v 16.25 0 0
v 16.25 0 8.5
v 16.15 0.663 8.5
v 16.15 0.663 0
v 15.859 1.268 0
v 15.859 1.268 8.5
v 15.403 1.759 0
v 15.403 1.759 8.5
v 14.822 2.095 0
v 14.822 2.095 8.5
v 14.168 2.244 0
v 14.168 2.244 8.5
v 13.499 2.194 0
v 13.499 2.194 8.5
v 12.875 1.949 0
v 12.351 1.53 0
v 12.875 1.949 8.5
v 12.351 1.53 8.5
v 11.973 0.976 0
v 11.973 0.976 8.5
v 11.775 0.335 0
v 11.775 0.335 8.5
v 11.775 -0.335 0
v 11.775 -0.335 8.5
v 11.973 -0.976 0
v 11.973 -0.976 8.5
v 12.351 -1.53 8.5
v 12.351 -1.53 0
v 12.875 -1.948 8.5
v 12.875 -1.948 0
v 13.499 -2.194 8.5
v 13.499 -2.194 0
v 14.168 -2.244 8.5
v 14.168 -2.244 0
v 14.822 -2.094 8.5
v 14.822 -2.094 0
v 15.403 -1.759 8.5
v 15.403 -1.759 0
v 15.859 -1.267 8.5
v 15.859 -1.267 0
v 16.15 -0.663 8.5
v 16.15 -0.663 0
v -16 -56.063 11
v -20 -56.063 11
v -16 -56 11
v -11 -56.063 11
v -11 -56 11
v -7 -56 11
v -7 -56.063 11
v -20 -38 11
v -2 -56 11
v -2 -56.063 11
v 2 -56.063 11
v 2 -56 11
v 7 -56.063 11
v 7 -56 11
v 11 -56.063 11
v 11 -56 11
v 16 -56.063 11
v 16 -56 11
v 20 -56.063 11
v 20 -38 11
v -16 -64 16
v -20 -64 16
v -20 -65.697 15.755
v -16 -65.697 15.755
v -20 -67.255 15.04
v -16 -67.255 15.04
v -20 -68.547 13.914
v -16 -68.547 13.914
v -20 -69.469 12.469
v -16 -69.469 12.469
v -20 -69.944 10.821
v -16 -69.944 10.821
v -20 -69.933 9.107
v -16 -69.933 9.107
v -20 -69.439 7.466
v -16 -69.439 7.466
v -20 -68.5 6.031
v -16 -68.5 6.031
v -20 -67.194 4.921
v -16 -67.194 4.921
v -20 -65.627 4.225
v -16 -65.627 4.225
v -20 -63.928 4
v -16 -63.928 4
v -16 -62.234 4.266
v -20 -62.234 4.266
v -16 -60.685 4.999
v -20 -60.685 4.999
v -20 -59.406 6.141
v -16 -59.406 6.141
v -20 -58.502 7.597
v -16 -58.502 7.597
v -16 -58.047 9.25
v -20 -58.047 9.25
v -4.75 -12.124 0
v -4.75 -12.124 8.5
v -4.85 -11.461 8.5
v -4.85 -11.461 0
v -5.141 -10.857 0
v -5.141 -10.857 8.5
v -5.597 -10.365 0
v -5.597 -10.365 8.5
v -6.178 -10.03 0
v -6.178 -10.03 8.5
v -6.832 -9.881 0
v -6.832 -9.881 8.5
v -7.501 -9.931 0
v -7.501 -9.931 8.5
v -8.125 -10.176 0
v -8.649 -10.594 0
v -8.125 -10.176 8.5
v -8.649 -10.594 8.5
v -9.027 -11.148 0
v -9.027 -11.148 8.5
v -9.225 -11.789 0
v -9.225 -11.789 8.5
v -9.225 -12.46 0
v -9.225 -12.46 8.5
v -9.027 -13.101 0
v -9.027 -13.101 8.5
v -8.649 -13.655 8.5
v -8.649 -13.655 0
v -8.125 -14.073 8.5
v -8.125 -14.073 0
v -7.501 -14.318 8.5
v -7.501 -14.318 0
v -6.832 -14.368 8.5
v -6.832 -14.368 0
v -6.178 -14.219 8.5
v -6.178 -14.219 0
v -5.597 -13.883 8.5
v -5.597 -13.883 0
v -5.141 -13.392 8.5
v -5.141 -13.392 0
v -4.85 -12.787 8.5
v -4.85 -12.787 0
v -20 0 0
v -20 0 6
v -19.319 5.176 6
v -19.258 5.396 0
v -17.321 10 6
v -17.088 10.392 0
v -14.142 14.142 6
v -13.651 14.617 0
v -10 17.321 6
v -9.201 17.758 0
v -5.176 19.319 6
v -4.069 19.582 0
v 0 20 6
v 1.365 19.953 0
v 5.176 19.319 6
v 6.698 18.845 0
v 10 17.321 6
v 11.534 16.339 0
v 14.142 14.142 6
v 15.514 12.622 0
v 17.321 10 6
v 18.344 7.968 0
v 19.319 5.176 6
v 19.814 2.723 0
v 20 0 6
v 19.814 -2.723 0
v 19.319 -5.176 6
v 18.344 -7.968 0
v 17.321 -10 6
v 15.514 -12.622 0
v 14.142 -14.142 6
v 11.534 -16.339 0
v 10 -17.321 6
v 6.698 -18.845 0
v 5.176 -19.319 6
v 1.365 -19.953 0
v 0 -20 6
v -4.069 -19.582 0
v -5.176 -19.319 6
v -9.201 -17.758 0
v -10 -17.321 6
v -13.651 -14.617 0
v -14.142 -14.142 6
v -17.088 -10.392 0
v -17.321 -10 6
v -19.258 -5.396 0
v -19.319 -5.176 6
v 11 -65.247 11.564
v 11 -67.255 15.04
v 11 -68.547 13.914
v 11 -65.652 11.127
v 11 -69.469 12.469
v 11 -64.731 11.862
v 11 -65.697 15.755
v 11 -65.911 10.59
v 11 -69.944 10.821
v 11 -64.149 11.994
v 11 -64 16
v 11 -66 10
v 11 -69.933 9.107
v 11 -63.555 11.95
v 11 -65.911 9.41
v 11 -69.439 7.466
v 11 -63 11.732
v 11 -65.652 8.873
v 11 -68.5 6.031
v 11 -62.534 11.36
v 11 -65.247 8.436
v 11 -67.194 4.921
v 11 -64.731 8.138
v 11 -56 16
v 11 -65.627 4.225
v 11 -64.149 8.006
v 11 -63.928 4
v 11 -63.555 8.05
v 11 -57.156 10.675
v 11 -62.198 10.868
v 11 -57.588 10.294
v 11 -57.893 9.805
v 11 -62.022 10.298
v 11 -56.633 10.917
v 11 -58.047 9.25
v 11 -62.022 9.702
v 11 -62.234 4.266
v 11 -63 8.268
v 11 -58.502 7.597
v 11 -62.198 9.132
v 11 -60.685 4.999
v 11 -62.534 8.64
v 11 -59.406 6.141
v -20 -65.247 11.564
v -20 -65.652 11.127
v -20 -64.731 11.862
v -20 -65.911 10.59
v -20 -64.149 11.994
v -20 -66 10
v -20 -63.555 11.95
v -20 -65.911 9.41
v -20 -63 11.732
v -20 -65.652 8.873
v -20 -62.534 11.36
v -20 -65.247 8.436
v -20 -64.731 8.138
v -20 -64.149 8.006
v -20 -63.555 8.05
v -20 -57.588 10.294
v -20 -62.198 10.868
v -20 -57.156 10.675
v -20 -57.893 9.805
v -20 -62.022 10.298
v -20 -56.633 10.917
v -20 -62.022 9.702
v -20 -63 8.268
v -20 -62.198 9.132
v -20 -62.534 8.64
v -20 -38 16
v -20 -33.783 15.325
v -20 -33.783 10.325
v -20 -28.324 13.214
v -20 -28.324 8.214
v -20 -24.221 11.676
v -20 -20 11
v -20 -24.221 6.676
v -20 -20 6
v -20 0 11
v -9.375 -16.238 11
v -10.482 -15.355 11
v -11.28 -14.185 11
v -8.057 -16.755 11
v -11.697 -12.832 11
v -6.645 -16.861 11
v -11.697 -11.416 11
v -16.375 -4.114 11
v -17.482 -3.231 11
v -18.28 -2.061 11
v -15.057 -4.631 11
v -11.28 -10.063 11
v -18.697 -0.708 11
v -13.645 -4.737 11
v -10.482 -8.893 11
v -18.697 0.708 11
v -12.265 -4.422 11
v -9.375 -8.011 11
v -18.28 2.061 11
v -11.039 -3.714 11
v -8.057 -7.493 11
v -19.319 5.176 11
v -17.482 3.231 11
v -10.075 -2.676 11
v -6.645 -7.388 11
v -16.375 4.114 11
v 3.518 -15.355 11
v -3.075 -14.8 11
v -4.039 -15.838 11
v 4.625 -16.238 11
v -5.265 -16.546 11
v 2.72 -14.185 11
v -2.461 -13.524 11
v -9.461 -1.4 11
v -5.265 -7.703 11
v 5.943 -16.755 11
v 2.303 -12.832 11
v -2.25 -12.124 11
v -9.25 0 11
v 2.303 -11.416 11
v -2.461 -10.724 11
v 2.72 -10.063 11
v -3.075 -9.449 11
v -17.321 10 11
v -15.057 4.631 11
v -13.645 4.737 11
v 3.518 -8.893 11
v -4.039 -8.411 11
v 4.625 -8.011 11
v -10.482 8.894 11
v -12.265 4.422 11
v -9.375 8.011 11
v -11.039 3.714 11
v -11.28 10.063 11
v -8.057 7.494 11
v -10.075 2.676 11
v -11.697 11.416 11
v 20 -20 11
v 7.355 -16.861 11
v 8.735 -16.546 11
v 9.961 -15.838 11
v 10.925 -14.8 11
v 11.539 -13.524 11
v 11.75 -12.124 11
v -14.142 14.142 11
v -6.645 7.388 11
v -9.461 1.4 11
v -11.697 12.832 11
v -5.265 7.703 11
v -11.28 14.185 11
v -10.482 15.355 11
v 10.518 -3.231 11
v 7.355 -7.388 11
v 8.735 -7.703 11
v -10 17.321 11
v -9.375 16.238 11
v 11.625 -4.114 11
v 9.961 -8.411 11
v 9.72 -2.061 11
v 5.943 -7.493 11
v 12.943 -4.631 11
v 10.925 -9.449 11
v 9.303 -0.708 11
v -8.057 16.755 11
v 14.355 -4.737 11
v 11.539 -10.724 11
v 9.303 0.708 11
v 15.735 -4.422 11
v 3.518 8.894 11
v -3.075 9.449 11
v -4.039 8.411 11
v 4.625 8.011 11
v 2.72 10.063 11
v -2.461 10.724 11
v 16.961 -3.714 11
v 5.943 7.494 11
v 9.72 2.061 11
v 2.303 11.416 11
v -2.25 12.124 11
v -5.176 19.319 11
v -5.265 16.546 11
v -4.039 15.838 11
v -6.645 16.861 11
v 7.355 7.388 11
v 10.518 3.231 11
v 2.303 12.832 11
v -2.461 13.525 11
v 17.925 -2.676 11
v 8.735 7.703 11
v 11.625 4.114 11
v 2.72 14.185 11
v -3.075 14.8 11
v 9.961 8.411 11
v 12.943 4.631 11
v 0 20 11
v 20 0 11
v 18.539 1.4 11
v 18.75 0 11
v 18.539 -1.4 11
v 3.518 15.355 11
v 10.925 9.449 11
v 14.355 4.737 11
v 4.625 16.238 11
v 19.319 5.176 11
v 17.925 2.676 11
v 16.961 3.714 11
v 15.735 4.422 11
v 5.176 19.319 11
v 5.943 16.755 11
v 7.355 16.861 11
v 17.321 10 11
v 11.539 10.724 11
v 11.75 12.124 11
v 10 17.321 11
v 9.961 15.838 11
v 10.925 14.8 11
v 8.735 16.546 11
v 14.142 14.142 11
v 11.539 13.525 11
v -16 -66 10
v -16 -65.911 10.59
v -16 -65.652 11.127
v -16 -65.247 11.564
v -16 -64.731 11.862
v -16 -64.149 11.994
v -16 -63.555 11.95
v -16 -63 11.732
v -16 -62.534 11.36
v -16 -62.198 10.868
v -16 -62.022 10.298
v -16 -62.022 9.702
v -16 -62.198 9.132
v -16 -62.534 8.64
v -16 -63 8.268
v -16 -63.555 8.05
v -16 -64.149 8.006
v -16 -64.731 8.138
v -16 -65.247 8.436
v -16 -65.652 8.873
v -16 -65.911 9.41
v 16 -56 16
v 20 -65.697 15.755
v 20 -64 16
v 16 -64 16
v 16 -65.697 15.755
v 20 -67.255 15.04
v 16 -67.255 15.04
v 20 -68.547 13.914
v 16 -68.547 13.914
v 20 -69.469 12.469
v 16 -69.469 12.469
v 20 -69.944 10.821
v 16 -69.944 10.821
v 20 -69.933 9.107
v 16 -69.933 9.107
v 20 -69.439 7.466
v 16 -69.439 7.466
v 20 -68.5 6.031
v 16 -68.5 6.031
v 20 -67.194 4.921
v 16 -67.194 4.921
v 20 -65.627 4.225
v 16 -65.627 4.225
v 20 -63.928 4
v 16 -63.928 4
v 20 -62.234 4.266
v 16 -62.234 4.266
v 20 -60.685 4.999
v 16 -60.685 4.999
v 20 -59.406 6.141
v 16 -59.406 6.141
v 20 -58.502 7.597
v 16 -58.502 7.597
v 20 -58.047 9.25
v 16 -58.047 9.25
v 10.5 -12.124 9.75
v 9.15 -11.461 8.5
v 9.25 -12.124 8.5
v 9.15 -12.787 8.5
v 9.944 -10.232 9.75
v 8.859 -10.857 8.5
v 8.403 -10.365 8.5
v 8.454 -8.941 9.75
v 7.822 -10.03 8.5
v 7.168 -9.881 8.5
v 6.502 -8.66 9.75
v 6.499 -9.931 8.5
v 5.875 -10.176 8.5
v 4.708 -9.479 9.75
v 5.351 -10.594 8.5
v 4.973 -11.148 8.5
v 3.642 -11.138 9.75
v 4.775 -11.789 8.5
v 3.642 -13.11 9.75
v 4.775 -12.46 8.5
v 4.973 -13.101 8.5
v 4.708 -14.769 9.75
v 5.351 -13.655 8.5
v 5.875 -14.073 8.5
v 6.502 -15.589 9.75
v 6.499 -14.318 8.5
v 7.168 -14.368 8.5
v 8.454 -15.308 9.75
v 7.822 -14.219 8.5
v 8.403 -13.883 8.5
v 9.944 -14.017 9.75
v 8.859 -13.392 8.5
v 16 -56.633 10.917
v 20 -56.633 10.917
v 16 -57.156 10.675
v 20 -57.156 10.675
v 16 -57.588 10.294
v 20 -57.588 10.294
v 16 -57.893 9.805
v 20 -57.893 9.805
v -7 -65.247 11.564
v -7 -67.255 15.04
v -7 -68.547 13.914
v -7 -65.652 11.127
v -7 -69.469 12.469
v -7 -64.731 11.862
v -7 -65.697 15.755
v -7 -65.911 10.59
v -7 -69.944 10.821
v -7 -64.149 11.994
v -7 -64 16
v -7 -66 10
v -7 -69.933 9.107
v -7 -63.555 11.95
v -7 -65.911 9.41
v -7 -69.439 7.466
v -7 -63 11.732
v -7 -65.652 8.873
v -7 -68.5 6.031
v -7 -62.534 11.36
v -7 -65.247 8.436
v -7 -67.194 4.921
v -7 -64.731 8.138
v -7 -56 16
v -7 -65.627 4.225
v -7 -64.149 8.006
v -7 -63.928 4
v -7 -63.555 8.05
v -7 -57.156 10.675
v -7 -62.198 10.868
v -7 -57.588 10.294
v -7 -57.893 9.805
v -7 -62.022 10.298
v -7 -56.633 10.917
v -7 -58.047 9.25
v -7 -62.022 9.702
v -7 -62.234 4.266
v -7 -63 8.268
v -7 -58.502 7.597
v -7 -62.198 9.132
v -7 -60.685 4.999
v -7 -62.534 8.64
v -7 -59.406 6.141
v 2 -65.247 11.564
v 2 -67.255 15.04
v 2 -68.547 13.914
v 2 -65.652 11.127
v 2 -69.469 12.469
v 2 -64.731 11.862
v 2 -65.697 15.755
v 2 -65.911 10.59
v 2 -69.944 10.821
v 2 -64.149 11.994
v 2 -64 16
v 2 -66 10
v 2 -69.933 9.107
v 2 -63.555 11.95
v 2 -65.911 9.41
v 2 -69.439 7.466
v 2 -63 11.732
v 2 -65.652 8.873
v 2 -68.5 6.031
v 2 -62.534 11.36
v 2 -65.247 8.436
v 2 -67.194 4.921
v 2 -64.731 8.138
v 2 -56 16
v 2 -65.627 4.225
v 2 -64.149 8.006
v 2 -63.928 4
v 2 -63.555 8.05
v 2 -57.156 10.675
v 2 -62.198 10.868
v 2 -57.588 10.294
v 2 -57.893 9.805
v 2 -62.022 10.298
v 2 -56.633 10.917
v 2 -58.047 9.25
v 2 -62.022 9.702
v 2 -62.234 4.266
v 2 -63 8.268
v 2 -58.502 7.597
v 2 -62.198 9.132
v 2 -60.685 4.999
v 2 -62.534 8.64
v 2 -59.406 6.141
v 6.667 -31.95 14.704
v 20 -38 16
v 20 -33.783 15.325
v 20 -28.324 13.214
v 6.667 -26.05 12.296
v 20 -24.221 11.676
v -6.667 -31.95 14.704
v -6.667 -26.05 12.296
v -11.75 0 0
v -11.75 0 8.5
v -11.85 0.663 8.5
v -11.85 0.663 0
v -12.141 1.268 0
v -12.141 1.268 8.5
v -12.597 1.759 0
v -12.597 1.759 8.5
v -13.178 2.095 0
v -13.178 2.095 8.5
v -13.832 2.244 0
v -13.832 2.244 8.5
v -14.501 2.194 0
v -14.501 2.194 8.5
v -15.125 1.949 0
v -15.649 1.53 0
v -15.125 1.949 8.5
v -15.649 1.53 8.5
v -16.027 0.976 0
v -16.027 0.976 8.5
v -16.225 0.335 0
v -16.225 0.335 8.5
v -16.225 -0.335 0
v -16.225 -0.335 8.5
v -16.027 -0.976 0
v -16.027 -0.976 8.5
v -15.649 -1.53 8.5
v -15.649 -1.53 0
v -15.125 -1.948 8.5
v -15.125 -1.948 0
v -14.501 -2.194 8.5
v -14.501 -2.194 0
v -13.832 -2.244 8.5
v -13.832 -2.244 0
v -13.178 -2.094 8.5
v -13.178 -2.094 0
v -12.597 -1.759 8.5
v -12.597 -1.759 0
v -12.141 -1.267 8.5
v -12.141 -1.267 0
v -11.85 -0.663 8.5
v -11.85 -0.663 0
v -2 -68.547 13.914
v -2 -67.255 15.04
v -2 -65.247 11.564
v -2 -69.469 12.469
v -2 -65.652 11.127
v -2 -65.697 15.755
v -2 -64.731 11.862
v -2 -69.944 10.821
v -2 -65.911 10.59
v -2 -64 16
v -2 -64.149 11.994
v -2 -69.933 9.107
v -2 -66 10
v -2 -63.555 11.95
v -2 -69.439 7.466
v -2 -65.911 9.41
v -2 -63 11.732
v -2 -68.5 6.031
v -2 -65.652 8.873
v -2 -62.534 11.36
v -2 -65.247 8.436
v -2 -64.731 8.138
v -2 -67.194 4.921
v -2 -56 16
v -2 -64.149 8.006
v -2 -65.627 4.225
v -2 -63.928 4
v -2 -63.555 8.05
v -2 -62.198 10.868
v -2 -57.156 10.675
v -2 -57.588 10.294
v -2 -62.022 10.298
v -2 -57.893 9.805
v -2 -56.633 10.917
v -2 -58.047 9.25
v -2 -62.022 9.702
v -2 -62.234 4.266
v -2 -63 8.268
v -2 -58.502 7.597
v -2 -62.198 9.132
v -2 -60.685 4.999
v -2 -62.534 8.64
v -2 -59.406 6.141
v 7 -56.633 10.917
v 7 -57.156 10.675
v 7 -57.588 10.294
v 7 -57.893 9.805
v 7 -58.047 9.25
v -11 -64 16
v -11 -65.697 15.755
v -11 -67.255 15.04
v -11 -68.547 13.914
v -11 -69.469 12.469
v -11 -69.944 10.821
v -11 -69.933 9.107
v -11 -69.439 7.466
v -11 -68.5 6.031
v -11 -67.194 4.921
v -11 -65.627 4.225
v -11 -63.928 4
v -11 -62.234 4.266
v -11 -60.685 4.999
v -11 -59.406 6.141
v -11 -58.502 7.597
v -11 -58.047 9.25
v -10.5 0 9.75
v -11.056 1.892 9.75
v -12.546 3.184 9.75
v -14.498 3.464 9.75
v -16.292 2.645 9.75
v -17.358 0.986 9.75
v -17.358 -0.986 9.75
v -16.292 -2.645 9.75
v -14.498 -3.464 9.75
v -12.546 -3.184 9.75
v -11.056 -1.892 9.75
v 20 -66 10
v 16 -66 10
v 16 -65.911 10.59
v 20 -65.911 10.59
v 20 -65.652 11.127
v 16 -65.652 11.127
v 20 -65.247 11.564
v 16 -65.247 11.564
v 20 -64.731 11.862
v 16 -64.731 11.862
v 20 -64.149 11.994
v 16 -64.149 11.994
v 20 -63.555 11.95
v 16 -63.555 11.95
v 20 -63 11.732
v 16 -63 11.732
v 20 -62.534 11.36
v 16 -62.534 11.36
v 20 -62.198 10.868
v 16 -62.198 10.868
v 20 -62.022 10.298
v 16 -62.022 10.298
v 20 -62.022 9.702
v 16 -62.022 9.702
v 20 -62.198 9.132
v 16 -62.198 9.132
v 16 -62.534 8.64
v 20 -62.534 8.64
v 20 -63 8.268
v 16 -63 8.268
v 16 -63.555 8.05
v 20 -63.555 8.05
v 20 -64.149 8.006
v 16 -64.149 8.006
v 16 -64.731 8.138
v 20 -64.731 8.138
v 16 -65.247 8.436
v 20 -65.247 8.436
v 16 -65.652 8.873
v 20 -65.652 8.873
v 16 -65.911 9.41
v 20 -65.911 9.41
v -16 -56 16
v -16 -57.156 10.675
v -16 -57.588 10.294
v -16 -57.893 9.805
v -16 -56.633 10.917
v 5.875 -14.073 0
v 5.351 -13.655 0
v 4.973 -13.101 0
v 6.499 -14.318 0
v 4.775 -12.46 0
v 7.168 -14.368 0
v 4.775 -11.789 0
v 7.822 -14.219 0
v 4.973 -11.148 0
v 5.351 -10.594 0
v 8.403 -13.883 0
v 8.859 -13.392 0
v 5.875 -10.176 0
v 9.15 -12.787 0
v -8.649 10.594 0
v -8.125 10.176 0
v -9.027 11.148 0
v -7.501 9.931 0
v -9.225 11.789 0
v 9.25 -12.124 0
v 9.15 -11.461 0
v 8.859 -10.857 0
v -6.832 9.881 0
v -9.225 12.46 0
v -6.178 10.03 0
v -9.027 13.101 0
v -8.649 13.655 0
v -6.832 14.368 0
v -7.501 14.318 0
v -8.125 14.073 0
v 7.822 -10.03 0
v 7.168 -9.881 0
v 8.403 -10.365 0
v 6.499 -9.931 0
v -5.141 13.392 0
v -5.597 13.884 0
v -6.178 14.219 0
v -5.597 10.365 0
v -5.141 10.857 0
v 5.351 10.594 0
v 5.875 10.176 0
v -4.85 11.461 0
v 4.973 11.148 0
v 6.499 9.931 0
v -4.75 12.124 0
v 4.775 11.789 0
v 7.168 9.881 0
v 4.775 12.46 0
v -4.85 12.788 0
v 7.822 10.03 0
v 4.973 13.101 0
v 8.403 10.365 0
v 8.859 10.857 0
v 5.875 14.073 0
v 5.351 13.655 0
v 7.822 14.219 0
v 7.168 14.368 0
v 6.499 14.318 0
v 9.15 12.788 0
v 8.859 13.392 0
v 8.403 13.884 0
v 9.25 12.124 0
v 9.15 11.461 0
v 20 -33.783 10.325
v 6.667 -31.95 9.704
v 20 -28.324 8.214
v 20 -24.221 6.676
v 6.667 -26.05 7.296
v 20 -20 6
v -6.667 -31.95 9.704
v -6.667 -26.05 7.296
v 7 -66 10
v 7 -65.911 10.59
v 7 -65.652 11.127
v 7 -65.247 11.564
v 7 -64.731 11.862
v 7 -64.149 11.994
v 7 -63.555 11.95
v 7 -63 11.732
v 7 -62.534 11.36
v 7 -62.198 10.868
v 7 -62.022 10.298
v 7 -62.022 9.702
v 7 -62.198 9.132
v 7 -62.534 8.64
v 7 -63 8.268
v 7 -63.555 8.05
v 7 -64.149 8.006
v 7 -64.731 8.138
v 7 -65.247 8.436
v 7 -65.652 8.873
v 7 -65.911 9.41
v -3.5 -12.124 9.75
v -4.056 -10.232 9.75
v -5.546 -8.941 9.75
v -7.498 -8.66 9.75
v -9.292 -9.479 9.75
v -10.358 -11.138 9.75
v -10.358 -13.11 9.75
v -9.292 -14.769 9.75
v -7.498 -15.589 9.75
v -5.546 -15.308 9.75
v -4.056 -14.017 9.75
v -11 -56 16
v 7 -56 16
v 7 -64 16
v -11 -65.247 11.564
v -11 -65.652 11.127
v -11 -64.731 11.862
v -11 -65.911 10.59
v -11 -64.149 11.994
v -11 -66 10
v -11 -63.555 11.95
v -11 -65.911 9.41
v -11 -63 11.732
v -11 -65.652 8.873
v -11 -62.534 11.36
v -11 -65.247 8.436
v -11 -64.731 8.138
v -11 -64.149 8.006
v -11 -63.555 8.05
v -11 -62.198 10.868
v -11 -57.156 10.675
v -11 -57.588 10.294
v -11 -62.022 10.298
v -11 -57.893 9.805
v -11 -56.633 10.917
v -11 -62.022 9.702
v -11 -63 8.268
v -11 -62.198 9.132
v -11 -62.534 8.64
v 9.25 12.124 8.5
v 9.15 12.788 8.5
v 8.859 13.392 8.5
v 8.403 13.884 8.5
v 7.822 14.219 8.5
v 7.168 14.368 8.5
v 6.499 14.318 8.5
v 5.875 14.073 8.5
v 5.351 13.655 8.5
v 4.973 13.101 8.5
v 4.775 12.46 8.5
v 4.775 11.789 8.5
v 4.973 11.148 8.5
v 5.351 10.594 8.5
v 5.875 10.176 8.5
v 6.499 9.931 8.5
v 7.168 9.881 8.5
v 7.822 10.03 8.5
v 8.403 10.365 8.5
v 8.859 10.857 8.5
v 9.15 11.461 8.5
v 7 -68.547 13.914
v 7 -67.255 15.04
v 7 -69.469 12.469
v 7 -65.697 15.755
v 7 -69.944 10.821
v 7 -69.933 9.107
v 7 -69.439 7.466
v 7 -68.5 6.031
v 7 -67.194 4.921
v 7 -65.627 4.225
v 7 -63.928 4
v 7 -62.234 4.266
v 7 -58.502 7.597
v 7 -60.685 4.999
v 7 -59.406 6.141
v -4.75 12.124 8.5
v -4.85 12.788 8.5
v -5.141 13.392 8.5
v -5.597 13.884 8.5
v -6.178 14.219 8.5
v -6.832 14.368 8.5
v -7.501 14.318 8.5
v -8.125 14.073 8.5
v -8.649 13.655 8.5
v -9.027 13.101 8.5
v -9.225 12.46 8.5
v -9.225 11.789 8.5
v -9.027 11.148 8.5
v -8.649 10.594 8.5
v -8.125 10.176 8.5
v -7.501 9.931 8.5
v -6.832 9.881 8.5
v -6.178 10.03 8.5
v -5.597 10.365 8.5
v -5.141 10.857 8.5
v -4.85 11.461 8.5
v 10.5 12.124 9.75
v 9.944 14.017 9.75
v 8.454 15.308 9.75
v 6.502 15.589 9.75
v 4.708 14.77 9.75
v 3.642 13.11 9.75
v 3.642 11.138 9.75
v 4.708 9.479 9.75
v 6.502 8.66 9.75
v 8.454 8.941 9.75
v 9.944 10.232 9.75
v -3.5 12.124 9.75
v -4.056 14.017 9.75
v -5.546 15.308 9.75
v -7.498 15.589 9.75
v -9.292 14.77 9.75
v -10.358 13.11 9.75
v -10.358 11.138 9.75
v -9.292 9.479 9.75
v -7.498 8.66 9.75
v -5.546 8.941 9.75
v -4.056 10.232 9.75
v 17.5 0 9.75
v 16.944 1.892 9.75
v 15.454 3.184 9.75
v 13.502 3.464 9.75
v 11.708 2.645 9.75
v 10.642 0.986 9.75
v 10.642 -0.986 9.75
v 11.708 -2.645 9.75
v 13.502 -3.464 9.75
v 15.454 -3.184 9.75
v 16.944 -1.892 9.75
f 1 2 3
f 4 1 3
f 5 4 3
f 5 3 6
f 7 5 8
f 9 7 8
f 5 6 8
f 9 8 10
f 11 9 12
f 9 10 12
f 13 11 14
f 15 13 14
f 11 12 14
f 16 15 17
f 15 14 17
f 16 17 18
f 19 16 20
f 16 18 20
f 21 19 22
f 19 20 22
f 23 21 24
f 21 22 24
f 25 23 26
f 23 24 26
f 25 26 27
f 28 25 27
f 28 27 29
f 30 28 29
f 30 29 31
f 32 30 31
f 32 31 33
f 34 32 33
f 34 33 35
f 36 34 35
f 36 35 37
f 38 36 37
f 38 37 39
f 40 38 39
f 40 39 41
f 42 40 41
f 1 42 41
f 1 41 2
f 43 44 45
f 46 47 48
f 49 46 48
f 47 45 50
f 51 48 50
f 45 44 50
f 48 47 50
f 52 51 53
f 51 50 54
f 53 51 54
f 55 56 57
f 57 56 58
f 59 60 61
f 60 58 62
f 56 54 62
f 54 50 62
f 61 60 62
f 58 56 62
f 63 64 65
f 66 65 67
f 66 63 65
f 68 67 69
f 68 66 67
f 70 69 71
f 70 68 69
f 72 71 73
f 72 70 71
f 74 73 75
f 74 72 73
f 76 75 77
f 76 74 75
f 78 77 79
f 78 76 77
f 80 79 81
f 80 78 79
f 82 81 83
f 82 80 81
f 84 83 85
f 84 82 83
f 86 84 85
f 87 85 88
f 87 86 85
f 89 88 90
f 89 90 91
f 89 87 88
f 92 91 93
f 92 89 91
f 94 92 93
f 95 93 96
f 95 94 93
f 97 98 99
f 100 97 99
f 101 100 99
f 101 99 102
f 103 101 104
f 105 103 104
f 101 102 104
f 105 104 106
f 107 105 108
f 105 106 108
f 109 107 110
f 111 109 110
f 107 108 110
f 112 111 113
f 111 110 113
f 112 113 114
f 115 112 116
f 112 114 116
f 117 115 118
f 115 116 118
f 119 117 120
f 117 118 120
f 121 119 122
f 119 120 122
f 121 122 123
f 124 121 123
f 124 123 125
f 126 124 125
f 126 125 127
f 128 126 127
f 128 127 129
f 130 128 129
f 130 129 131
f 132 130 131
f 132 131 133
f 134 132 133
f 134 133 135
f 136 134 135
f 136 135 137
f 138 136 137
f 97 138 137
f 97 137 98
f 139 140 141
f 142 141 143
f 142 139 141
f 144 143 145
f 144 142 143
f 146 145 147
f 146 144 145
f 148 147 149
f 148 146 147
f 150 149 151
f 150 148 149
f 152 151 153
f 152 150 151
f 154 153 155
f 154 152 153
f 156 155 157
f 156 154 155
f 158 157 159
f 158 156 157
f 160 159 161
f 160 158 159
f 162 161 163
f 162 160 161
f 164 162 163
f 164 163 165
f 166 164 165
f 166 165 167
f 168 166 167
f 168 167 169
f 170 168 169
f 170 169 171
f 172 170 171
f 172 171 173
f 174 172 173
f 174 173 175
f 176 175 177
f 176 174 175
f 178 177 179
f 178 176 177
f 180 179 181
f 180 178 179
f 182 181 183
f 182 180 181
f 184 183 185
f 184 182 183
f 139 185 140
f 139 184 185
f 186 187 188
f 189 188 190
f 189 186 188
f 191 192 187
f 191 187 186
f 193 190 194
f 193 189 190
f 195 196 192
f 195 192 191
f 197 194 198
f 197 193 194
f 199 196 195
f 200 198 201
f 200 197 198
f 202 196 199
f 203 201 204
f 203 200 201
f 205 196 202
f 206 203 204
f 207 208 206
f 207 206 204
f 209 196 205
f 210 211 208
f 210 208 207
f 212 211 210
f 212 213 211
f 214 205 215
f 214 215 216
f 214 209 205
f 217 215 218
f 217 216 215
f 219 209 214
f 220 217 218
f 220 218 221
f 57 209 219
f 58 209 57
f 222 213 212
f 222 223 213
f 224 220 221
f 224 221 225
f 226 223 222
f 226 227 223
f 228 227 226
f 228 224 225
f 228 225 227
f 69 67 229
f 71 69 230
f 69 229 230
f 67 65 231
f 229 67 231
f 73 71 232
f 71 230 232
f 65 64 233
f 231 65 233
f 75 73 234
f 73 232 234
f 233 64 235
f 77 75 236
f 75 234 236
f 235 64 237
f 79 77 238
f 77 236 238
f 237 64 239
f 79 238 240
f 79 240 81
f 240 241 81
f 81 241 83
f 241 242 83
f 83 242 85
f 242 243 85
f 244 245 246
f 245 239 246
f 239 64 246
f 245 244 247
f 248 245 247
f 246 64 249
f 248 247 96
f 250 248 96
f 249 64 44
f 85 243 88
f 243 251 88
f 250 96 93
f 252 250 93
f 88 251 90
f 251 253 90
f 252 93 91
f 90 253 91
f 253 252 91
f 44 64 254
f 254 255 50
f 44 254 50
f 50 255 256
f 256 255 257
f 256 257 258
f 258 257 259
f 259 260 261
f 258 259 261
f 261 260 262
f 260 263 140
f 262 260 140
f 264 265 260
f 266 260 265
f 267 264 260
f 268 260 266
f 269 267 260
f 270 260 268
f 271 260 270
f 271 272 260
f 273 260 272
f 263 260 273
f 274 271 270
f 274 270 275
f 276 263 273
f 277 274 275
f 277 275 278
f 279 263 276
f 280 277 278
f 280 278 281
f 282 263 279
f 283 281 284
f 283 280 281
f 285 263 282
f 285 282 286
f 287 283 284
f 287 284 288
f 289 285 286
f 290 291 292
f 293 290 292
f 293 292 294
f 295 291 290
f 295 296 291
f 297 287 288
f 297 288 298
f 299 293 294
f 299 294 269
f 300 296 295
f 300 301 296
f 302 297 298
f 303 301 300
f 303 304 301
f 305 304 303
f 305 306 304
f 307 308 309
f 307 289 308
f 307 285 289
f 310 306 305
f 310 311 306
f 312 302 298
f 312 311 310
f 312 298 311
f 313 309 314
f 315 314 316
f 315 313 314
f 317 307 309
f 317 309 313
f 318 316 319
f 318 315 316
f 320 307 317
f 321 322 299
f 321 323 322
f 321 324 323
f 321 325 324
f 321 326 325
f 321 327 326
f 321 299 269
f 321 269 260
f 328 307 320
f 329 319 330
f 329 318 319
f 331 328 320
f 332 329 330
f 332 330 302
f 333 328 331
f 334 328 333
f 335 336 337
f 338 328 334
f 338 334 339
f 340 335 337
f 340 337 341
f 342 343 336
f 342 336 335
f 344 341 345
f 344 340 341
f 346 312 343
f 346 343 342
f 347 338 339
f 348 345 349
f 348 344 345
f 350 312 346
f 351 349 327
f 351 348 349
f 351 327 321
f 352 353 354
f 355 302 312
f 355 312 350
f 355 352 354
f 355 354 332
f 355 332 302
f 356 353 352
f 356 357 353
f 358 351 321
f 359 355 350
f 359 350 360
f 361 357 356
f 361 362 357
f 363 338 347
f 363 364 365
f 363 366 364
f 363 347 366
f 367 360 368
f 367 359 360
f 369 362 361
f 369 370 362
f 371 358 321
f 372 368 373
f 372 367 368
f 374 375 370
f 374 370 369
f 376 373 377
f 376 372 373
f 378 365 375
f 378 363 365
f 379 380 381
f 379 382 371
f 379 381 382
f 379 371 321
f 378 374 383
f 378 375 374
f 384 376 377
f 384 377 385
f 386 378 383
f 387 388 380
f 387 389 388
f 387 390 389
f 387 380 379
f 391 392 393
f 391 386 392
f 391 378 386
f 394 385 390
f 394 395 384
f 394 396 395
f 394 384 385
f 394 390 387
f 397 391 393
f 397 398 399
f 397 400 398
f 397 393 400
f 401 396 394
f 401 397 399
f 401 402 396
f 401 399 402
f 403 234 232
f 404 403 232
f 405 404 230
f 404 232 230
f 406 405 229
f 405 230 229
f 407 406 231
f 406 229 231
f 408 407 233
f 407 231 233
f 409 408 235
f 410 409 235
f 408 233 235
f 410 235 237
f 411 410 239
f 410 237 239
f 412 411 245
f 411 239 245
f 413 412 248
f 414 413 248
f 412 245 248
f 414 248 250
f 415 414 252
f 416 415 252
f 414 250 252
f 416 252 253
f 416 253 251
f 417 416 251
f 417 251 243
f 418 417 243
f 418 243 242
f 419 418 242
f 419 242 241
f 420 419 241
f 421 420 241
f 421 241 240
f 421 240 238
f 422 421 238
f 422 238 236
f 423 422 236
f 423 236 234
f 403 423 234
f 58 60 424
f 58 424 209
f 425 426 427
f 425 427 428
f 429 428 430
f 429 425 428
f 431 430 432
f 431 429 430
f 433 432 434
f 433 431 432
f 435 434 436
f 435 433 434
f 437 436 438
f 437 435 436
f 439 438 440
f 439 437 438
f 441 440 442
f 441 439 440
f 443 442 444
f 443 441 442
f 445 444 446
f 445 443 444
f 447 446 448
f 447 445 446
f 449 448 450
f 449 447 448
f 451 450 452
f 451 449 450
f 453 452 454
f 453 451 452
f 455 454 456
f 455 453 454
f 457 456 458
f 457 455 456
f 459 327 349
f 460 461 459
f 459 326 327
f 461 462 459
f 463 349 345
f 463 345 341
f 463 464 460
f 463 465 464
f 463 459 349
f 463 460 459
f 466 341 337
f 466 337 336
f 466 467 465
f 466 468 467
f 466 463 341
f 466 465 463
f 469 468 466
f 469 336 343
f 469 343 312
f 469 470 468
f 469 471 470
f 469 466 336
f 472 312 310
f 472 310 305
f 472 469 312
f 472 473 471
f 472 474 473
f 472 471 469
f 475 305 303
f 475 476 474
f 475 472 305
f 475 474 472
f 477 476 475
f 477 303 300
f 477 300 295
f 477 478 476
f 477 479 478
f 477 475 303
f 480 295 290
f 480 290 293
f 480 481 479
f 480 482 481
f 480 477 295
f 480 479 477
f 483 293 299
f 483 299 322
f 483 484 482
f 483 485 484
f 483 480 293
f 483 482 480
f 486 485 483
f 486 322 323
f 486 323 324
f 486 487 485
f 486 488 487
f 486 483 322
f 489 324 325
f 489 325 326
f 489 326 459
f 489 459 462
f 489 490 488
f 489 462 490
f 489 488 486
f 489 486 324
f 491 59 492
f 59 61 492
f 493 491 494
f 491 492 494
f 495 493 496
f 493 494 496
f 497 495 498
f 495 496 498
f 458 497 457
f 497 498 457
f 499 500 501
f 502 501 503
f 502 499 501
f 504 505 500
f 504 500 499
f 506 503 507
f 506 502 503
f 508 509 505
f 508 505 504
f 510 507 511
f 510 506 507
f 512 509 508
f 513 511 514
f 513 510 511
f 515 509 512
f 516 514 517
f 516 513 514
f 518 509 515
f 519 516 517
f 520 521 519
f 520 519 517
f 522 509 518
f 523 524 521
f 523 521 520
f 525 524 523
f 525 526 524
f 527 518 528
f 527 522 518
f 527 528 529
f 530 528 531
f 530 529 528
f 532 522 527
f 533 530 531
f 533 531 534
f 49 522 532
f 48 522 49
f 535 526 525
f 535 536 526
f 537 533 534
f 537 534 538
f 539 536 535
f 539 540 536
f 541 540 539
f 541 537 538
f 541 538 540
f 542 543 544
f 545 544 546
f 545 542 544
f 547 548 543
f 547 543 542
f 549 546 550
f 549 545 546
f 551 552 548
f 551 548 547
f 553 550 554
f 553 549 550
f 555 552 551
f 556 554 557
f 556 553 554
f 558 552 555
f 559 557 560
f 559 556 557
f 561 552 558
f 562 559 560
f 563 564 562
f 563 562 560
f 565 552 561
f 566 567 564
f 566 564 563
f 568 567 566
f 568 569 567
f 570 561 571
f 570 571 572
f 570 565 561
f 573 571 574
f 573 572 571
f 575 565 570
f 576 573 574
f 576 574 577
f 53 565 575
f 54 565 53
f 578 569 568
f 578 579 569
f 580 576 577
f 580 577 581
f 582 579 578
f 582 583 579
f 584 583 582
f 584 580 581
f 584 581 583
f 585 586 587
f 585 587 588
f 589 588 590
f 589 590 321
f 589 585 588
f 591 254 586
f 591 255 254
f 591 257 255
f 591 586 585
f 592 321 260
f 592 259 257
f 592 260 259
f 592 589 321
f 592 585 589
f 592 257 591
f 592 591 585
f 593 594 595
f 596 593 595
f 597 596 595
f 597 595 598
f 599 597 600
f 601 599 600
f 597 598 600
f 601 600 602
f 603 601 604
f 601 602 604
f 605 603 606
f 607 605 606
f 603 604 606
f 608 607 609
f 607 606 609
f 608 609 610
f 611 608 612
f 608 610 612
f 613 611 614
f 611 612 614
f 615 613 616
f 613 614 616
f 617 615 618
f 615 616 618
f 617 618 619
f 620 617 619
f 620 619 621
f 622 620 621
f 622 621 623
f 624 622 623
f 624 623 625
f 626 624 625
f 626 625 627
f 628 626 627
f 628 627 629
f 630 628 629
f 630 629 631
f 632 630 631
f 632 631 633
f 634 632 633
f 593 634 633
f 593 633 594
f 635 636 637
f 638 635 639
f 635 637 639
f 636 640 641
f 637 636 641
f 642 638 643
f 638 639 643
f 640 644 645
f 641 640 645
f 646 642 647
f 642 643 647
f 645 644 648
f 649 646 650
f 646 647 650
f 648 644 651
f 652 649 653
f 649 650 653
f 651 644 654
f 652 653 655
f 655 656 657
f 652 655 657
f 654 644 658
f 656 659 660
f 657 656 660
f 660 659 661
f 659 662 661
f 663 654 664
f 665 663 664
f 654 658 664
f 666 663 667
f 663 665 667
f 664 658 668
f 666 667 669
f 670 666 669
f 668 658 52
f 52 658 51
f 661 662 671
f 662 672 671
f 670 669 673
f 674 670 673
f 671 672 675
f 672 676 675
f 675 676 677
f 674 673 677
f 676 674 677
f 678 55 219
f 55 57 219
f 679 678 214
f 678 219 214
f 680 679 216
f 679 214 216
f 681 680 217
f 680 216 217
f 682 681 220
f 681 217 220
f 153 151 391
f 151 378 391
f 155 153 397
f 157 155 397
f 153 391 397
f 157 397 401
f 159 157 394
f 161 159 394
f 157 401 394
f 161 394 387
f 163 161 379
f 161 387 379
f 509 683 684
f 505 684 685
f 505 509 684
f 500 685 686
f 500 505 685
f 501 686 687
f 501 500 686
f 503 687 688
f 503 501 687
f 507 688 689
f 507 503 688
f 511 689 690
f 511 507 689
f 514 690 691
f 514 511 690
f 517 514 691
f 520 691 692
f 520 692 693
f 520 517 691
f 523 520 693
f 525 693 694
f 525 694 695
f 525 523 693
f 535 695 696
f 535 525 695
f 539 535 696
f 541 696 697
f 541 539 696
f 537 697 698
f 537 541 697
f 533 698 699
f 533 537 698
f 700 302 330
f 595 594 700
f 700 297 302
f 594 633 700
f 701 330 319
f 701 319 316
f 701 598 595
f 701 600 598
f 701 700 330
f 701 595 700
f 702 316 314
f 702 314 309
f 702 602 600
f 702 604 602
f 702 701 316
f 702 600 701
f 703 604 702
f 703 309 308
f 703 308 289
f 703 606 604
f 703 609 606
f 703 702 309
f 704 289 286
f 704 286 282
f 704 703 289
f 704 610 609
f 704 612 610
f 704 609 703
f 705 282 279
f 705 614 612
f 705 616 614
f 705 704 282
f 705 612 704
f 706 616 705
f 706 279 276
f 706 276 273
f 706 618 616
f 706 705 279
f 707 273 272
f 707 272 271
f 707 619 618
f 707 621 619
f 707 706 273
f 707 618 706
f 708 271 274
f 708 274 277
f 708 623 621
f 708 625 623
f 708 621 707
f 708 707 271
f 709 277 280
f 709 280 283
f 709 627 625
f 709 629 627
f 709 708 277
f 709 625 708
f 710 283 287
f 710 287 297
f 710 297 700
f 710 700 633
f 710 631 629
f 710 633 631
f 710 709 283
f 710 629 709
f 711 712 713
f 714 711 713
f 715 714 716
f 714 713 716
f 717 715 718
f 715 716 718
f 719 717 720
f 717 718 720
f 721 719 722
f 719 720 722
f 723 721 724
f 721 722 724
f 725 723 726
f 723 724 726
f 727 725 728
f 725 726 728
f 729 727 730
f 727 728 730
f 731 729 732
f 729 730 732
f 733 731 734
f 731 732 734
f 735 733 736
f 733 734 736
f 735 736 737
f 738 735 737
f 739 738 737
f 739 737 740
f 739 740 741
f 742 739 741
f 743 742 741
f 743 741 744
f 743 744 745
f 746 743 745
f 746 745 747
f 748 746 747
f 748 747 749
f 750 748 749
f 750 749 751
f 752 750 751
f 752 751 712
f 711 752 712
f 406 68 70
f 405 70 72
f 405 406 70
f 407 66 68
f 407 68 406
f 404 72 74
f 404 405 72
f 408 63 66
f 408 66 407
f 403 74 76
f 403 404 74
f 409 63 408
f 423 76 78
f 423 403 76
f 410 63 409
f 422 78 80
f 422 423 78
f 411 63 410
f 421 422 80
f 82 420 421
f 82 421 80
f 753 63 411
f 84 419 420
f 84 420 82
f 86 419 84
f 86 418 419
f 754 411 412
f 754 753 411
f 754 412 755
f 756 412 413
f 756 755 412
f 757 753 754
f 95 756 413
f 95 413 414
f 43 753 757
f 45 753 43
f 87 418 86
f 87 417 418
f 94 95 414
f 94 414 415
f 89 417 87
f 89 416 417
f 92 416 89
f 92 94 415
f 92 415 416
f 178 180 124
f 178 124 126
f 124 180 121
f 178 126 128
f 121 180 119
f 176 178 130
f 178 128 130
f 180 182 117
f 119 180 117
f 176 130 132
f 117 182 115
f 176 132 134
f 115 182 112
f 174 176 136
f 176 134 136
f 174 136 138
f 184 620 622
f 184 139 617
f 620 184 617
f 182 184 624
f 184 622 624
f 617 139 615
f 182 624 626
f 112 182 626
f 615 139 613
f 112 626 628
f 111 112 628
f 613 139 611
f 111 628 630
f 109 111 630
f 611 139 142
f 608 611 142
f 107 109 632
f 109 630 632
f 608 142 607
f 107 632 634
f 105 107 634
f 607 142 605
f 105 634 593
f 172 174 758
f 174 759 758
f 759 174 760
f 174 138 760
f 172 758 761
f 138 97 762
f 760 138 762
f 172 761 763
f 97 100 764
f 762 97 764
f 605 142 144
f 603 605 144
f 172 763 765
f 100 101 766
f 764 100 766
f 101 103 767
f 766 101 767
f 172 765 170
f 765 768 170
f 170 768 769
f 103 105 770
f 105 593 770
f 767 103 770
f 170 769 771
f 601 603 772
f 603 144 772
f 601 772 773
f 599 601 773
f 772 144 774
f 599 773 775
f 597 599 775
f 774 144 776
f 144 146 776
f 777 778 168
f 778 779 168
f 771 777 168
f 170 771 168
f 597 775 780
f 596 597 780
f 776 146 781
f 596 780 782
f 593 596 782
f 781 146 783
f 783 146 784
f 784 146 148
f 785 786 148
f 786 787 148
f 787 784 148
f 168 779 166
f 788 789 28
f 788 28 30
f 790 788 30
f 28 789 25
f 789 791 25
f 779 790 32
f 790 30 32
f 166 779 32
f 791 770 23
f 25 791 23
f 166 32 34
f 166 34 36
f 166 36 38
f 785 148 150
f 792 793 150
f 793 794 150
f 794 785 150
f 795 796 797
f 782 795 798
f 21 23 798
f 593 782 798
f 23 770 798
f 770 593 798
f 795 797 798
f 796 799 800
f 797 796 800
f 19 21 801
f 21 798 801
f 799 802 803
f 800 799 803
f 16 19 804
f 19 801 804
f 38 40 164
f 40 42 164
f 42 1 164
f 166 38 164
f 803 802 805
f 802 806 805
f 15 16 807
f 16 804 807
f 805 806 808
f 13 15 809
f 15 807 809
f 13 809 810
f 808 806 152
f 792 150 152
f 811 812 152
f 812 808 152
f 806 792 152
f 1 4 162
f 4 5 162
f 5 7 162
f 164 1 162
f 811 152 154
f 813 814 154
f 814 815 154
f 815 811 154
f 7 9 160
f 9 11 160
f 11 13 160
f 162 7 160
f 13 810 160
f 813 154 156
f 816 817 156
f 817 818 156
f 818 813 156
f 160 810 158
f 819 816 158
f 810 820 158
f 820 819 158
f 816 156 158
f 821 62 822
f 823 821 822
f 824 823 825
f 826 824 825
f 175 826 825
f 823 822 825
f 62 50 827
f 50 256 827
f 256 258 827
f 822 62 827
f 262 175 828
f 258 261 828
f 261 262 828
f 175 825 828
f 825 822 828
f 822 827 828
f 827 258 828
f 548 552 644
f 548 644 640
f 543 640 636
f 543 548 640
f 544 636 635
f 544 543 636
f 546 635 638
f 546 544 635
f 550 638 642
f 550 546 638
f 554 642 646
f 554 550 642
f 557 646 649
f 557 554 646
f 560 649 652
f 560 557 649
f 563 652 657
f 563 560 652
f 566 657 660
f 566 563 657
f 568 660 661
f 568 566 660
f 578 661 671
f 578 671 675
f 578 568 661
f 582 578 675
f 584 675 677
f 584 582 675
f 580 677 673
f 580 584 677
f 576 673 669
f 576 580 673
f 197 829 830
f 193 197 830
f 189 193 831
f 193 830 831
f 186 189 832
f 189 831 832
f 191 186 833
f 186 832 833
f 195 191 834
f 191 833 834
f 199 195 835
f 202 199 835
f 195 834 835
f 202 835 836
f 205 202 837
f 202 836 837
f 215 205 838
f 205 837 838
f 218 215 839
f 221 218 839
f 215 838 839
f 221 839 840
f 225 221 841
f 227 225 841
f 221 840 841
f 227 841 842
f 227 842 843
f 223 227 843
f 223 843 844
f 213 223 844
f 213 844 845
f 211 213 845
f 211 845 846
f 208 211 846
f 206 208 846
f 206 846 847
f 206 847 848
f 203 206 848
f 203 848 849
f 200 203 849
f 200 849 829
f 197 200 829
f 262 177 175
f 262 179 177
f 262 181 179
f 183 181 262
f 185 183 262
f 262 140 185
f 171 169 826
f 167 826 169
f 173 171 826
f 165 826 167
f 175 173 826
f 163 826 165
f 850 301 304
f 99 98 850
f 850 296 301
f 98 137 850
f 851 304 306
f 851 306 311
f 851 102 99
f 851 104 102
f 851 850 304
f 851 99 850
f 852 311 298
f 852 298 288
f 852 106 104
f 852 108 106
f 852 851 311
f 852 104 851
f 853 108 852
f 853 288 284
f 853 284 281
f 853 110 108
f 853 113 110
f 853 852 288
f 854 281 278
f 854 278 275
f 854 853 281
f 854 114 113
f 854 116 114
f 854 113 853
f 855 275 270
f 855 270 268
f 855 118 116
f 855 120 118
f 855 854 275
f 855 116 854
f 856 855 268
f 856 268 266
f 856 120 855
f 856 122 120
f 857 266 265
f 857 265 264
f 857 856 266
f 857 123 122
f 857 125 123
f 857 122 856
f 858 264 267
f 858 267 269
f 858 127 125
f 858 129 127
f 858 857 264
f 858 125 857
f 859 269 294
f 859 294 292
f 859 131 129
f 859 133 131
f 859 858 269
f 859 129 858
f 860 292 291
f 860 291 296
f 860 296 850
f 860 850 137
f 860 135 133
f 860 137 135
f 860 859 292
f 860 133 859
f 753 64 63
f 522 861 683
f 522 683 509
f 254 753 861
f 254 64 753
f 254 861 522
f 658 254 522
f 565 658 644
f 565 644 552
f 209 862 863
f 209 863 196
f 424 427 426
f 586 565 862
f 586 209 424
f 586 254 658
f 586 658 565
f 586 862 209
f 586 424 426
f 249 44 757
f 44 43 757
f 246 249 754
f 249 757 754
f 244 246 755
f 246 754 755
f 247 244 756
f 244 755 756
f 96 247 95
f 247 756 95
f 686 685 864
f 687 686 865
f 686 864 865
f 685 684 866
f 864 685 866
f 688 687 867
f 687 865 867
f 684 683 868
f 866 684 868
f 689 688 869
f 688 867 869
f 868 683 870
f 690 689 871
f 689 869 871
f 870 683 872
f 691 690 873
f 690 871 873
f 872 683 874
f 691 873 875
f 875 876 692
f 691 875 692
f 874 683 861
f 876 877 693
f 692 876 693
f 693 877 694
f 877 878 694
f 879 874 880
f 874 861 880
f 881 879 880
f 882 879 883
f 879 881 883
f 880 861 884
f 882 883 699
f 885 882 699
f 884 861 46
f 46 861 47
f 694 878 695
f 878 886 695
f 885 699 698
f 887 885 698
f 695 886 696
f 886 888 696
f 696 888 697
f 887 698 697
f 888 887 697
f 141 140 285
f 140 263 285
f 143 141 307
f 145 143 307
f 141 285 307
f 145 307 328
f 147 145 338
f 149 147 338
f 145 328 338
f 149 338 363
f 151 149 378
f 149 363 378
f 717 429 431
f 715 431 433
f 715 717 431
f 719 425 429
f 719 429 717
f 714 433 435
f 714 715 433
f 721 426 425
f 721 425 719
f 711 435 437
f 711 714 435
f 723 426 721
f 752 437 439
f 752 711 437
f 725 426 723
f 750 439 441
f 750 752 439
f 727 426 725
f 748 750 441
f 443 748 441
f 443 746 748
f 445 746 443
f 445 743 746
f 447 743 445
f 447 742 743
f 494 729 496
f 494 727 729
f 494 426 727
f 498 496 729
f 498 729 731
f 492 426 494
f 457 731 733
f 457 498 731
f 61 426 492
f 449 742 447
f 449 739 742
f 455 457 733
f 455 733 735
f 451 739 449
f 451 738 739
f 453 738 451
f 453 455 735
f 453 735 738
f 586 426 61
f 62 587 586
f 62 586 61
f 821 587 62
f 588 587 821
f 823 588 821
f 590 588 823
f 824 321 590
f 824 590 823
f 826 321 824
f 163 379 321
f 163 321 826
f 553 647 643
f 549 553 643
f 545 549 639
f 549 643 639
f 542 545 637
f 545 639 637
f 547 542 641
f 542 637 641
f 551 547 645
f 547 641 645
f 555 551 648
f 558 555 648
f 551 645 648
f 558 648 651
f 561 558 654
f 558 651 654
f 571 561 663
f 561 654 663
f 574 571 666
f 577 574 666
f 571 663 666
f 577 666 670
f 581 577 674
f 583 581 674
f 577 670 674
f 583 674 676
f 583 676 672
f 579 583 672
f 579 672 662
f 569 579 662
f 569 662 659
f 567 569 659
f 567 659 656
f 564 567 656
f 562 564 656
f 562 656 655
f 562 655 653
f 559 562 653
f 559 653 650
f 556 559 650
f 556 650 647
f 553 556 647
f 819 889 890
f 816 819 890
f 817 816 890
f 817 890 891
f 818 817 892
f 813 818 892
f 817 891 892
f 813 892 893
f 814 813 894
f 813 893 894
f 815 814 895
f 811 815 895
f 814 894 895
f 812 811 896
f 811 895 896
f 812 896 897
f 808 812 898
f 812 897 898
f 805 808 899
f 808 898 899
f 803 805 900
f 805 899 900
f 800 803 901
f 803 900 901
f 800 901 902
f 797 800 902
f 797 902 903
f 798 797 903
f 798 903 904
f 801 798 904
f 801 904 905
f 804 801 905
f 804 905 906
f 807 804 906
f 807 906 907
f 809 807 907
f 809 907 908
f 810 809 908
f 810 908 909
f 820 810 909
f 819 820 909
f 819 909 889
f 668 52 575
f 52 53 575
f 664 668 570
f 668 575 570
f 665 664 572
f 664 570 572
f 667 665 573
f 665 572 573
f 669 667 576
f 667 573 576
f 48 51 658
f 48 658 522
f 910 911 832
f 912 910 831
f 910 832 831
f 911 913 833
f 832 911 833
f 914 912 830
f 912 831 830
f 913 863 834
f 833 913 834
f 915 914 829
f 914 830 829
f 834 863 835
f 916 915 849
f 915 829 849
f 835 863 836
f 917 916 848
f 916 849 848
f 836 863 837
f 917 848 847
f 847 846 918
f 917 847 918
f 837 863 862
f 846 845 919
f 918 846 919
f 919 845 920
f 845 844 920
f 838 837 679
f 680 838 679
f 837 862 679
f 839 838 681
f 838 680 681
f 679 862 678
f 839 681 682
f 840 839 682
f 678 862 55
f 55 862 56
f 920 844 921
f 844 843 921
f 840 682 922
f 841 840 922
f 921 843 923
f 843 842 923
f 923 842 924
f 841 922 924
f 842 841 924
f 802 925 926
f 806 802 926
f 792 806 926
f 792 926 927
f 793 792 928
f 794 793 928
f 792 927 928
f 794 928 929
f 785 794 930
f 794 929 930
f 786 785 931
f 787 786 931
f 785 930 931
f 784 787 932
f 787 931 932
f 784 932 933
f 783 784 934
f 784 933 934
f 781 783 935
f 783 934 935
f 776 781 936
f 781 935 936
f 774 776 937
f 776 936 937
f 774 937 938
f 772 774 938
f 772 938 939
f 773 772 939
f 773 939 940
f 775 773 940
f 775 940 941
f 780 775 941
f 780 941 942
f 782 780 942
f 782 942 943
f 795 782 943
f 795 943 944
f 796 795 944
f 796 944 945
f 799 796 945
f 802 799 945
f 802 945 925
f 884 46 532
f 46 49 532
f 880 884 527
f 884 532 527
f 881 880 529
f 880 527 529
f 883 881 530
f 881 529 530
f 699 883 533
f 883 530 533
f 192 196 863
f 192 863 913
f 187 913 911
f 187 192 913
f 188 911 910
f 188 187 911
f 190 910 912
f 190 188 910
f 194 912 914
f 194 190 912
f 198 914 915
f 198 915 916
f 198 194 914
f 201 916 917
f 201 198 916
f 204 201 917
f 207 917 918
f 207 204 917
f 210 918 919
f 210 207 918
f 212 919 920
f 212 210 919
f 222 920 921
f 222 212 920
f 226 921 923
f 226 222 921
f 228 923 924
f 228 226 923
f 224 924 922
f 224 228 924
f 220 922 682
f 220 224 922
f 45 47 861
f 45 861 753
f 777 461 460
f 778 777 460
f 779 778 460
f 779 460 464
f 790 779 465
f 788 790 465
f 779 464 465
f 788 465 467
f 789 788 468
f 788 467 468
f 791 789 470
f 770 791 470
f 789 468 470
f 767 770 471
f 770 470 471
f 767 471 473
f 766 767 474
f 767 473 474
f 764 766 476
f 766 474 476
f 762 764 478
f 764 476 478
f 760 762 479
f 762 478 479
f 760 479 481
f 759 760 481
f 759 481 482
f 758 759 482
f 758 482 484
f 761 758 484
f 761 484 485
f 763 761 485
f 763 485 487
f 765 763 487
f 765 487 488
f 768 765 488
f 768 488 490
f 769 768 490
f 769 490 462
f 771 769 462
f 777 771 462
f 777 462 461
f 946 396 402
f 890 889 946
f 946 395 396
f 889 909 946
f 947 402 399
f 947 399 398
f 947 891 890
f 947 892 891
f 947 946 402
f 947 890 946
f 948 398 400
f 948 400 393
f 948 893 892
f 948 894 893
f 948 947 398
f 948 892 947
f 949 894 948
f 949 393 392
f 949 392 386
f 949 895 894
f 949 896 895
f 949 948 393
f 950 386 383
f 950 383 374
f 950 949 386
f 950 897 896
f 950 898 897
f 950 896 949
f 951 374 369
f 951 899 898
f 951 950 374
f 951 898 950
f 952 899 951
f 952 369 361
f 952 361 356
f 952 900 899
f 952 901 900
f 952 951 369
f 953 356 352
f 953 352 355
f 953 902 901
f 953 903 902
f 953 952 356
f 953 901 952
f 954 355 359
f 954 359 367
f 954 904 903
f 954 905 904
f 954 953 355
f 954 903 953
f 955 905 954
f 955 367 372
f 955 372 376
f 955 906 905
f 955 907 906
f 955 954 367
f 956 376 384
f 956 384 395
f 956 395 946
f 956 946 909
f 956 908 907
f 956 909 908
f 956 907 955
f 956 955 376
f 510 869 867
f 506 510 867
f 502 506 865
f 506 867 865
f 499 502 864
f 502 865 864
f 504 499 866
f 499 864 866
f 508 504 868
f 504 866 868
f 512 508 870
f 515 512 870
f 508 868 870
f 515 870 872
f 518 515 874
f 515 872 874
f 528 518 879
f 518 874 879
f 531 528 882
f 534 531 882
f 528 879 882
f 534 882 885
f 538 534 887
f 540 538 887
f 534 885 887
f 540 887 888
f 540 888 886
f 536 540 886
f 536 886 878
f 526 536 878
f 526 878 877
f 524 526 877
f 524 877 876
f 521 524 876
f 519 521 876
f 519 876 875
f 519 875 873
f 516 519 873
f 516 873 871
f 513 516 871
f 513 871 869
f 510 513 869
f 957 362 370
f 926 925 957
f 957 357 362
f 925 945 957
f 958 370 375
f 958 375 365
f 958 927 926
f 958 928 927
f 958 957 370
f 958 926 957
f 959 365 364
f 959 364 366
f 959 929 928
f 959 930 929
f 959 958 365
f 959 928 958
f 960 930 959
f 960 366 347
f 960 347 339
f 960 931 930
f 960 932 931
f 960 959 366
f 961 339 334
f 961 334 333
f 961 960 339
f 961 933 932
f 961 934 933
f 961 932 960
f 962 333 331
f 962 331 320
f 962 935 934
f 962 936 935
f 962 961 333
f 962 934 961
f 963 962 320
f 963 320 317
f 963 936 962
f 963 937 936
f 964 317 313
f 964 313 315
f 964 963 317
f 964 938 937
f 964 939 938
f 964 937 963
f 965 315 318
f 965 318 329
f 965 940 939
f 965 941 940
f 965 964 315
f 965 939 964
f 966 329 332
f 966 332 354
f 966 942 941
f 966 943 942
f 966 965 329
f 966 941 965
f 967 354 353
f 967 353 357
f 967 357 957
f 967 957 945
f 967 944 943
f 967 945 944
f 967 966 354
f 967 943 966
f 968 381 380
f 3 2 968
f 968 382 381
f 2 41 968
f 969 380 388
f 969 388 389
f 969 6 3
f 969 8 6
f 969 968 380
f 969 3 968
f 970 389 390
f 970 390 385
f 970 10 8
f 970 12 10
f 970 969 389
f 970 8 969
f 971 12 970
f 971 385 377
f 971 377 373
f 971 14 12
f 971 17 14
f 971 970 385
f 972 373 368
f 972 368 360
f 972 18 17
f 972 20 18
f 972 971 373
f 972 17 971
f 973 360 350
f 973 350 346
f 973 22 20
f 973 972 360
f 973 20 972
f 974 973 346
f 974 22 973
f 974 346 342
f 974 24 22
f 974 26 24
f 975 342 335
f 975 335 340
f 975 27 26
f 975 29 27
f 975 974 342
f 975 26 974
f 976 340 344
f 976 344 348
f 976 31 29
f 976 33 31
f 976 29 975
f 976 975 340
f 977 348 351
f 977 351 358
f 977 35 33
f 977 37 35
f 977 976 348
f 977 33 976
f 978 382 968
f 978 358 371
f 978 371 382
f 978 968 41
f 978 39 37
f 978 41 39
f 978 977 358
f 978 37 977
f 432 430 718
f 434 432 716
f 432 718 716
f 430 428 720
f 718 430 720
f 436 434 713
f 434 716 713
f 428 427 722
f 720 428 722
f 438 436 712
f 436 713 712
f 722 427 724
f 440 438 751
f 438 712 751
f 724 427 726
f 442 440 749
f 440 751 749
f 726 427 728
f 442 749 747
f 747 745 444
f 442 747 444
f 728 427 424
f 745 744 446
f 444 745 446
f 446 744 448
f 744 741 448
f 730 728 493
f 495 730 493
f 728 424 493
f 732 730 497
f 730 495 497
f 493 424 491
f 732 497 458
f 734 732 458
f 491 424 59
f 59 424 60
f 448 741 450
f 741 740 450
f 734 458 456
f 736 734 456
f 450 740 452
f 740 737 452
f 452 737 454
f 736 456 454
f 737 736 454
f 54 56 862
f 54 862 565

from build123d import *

# Parameters (mm, degrees)
SKETCH7_W           = 40
SKETCH7_H           = 40
BOSS_EXTRUDE1_DEPTH = 11
LOFT1_START         = -20
LOFT1_DEPTH         = 40
SKETCH16_W          = 49.026286786
SKETCH16_H          = 65.242270374
SKETCH16_R          = 20
CUT_EXTRUDE3_DEPTH  = 6
SKETCH17_W          = 40
SKETCH17_H          = 5
BOSS_EXTRUDE5_DEPTH = 18
SKETCH10_R          = 2.25
CUT_EXTRUDE1_DEPTH  = 25
SKETCH11_W          = 4
SKETCH11_H          = 5
BOSS_EXTRUDE3_DEPTH = 8
SKETCH14_R          = 6
BOSS_EXTRUDE4_DEPTH = 4
LPATTERN1_COUNT     = 5
LPATTERN1_PITCH     = 9
SKETCH15_R          = 2
CUT_EXTRUDE2_DEPTH  = 83.194890505
CHAMFER1_SIZE       = 2.5
FILLET2_R           = 2
FILLET3_R           = 20


# Read off the part's stored shape, not the designer's step: Loft1
with BuildPart() as part:
    # Sketch7 → Boss-Extrude1 (new body)
    with BuildSketch(Plane.XY):
        Rectangle(SKETCH7_W, SKETCH7_H)
    extrude(amount=BOSS_EXTRUDE1_DEPTH)

    # Loft1 outline → Loft1 (add)
    with BuildSketch(Plane.YZ.offset(LOFT1_START)):
        with BuildLine():
            add(Edge.make_bspline(
                [(-38, 16), (-31.772819436, 16), (-26.227180564, 11), (-20, 11)],
                knots=[0, 0, 0, 0, 1, 1, 1, 1], degree=3))
            Line((-38, 16), (-38, 11))
            add(Edge.make_bspline(
                [(-38, 11), (-31.772819436, 11), (-26.227180564, 6), (-20, 6)],
                knots=[0, 0, 0, 0, 1, 1, 1, 1], degree=3))
            Line((-20, 6), (-20, 11))
        make_face()
    extrude(amount=LOFT1_DEPTH)

    # Sketch16 → Cut-Extrude3 (cut)
    with BuildSketch(Plane(origin=(0, 0, 0), x_dir=(-1, 0, 0), z_dir=(0, 0, -1))):
        Rectangle(SKETCH16_W, SKETCH16_H)
        Circle(SKETCH16_R, mode=Mode.SUBTRACT)
    extrude(amount=-CUT_EXTRUDE3_DEPTH, mode=Mode.SUBTRACT)

    # Sketch17 → Boss-Extrude5 (add)
    with BuildSketch(Plane(origin=(0, -38, 0), x_dir=(-1, 0, 0), z_dir=(0, -1, 0))):
        with Locations((0, -13.5)):
            Rectangle(SKETCH17_W, SKETCH17_H)
    extrude(amount=BOSS_EXTRUDE5_DEPTH)

    # Sketch10 → Cut-Extrude1 (cut)
    with BuildSketch(Plane.XY.offset(11)):
        with Locations((-7.00009521, 12.124420806)):
            Circle(SKETCH10_R)
        with Locations((6.99990479, 12.124420806)):
            Circle(SKETCH10_R)
        with Locations((13.99990479, 6.5153e-05)):
            Circle(SKETCH10_R)
        with Locations((6.99990479, -12.1242905)):
            Circle(SKETCH10_R)
        with Locations((-7.00009521, -12.1242905)):
            Circle(SKETCH10_R)
        with Locations((-14.00009521, 6.5153e-05)):
            Circle(SKETCH10_R)
    extrude(amount=-CUT_EXTRUDE1_DEPTH, mode=Mode.SUBTRACT)

    # Sketch11 → Boss-Extrude3 (add)
    with BuildSketch(Plane(origin=(0, -56, -3.472963553), x_dir=(1, 0, 0), z_dir=(0, 1, 0))):
        with Locations((-18, -16.972963553)):
            Rectangle(SKETCH11_W, SKETCH11_H)
    boss_extrude3 = extrude(amount=-BOSS_EXTRUDE3_DEPTH)

    # Sketch14 → Boss-Extrude4 (add)
    with BuildSketch(Plane(origin=(-16, 0, 0), x_dir=(0, 0, -1), z_dir=(1, 0, 0))):
        with Locations((-10, -64)):
            Circle(SKETCH14_R)
    boss_extrude4 = extrude(amount=-BOSS_EXTRUDE4_DEPTH)

    # LPattern1: Boss-Extrude3, Boss-Extrude4 ×5
    with Locations(*[(i * LPATTERN1_PITCH, 0, 0) for i in range(1, LPATTERN1_COUNT)]):
        add(boss_extrude3)
        add(boss_extrude4)

    # Sketch15 → Cut-Extrude2 (cut, through all)
    with BuildSketch(Plane.ZY.offset(20)):
        with Locations(Location((10, -64, 0), (0, 0, 270))):
            Circle(SKETCH15_R)
    extrude(amount=-CUT_EXTRUDE2_DEPTH, mode=Mode.SUBTRACT)

    # Chamfer1
    chamfer1_edges = [part.edges().sort_by_distance(p)[0] for p in [
        (4.74990479, 12.124420806, 11),
        (-9.25009521, 12.124420806, 11),
        (-16.25009521, 6.5153e-05, 11),
        (-9.25009521, -12.1242905, 11),
        (4.74990479, -12.1242905, 11),
        (11.74990479, 6.5153e-05, 11),
    ]]
    chamfer(chamfer1_edges, length=CHAMFER1_SIZE)

    # Fillet2
    fillet2_edges = [part.edges().sort_by_distance(p)[0] for p in [
        (-18, -58.083920217, 11),
        (-9, -58.083920217, 11),
        (0, -58.083920217, 11),
        (9, -58.083920217, 11),
        (18, -58.083920217, 11),
    ]]
    fillet(fillet2_edges, radius=FILLET2_R)

    # Fillet3
    fillet3_edges = [part.edges().sort_by_distance(p)[0] for p in [
        (20, 20, 8.5),
        (-20, 20, 8.5),
    ]]
    fillet(fillet3_edges, radius=FILLET3_R - 0.0001)  # a hair under: the kernel refuses the full size


solid = part.part
